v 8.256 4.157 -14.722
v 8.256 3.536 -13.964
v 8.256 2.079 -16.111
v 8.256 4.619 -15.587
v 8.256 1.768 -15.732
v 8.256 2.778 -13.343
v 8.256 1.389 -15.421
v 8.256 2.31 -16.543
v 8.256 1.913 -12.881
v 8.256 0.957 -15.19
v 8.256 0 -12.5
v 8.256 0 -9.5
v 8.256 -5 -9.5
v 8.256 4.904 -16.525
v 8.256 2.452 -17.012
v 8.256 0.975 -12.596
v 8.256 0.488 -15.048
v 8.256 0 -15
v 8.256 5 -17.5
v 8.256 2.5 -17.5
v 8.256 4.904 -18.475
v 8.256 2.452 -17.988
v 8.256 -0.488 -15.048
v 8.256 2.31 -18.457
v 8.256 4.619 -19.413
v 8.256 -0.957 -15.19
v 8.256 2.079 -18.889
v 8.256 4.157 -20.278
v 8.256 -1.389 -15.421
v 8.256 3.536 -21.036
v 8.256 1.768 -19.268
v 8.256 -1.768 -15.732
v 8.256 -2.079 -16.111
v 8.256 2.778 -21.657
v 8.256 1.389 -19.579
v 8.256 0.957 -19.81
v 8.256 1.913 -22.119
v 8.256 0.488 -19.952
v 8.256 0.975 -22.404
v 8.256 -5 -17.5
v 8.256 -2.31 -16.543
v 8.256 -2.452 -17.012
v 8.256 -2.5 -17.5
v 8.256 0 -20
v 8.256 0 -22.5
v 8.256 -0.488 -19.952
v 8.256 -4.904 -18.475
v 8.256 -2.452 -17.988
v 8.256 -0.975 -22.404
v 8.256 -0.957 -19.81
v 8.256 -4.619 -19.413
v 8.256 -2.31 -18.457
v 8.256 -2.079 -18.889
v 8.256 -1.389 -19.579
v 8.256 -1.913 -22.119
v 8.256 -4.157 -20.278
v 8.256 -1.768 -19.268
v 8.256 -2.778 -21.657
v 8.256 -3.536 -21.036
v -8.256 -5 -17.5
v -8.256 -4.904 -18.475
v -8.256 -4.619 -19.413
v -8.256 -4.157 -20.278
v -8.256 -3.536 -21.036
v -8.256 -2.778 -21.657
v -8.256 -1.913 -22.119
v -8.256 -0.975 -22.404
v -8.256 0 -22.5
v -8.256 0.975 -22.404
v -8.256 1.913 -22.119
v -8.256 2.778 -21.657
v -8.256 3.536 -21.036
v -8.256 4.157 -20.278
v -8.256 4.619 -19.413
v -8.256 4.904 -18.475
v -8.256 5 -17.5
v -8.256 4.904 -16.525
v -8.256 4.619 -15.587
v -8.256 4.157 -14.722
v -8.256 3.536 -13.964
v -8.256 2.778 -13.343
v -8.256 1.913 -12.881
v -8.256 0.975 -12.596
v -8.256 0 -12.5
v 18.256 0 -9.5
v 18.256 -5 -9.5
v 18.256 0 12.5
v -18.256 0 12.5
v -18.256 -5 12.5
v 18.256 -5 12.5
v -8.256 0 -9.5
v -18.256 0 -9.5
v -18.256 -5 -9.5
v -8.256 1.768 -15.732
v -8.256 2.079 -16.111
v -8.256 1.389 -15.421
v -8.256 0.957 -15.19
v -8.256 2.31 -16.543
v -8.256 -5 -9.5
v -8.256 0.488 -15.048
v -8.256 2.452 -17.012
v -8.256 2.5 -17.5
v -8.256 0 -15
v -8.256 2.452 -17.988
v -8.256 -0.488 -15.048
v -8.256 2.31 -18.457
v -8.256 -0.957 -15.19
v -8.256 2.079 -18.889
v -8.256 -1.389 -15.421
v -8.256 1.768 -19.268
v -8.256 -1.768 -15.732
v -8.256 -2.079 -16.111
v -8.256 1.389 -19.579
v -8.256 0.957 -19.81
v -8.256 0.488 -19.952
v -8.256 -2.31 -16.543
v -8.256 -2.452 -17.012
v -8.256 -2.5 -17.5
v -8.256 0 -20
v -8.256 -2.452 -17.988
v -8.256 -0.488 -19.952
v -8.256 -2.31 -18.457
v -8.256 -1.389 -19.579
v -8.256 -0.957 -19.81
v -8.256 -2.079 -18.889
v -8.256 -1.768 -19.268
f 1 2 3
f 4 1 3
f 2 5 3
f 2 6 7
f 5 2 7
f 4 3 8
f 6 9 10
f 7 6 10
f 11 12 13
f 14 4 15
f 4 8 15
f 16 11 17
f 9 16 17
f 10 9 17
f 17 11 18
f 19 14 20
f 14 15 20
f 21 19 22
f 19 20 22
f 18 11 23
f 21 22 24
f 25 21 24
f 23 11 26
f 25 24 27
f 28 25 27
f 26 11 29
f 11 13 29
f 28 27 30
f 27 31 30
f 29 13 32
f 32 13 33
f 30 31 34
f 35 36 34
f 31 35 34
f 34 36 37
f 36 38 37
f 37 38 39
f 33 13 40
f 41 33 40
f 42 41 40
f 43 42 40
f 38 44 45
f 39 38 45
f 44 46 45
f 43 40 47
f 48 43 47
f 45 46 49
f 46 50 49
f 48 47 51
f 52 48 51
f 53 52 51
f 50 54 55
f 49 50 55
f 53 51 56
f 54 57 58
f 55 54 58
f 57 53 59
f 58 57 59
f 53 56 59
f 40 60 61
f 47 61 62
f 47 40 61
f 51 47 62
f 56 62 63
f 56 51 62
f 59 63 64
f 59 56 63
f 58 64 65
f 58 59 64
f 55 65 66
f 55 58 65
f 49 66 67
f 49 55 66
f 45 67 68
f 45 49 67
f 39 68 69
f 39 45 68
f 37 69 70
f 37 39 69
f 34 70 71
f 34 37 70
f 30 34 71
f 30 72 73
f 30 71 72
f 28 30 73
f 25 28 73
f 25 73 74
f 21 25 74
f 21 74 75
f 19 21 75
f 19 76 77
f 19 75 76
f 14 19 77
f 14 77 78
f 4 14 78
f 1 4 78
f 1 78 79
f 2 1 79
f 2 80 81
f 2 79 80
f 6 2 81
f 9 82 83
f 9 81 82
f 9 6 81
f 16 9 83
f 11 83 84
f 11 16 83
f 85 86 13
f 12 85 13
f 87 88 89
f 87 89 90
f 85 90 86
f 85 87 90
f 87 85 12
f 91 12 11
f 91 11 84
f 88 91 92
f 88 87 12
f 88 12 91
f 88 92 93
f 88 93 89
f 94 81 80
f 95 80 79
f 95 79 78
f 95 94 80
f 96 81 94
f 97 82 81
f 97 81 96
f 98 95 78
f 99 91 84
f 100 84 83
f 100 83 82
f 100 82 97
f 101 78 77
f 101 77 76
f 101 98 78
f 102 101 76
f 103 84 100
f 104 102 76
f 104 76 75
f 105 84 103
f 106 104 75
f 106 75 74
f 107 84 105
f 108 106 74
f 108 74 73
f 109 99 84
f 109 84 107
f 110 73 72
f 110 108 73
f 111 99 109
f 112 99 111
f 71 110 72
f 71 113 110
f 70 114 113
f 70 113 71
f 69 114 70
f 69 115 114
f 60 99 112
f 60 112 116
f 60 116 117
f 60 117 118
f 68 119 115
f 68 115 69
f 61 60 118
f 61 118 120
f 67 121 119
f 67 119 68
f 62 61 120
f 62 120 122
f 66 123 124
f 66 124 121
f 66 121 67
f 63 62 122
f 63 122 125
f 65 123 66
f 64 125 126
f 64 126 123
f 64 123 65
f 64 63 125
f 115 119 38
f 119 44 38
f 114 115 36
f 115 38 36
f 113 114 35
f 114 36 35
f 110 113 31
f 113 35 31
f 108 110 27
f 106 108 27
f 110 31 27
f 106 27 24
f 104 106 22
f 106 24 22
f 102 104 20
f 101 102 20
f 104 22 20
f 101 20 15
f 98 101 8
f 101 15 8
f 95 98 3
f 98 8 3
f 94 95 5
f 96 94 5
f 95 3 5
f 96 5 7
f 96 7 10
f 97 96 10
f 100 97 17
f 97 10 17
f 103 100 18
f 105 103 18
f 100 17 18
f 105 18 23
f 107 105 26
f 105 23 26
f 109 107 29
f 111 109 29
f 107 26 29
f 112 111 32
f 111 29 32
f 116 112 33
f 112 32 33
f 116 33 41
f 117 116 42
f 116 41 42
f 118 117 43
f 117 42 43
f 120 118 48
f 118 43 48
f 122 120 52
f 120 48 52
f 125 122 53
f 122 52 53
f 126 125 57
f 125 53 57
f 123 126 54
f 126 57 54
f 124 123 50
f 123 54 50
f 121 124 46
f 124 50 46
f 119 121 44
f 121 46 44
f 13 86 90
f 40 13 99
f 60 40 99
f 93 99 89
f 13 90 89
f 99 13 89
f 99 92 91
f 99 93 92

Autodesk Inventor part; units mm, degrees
ref_plane "YZ Plane" through (0, 0, 0) normal (1, 0, 0) x (0, 1, 0)
ref_plane "XZ Plane" through (0, 0, 0) normal (0, 1, 0) x (-1, 0, 0)
ref_plane "XY Plane" through (0, 0, 0) normal (0, 0, 1) x (1, 0, 0)
sketch "Sketch1" plane through (0, 0, 0) normal (0, 1, 0) x (-1, 0, 0)
  line L0 (-18.2565, -12.5) -> (18.2565, -12.5)
  line L1 (18.2565, -12.5) -> (18.2565, 12.5)
  line L2 (18.2565, 12.5) -> (-18.2565, 12.5)
  line L3 (-18.2565, 12.5) -> (-18.2565, -12.5)
  line L4 (-18.2565, -12.5) -> (18.2565, 12.5) construction
  line L5 (18.2565, -12.5) -> (-18.2565, 12.5) construction
  point P0 (0, 0)
  dimension "d0" = 36.513
  dimension "d1" = 25
extrude "Extrusion1" add sketch "Sketch1" against normal blind 5
sketch "Sketch2" plane through (18.2565, 0, 12.5) normal (1, 0, 0) x (0, 0, -1)
  circle A0 centre (30, 0) radius 5
  line L0 (25, 0) -> (25, -5) projected
  line L1 (25, -5) -> (0, -5) projected
  line L2 (0, -5) -> (25, -5) projected
  line L3 (25, -5) -> (30, -5)
  line L4 (30, -5) -> (30, 0)
  line L5 (30, 0) -> (25, 0)
  line L6 (25, 0) -> (25, -5)
  point P0 (12.5, 0)
  dimension "d4" = 5
  dimension "d5" = 10
  dimension "d6" = 5
extrude "Extrusion2" add sketch "Sketch2" against normal blind 36.513
sketch "Sketch3" plane through (18.2565, -5, 12.5) normal (1, 0, 0) x (0, 0, -1)
  circle A0 centre (30, 5) radius 2.5
  line L0 (0, 0) -> (30, 0) projected
  line L1 (0, 5) -> (0, 0) projected
  point P0 (12.5, 5)
  dimension "d9" = 5
  dimension "d10" = 30
  dimension "d11" = 5
extrude "Extrusion3" cut sketch "Sketch3" against normal blind 36.513
sketch "Sketch4" plane through (0, -5, 0) normal (0, -1, 0) x (1, 0, 0)
  line L0 (18.2565, 12.5) -> (18.2565, -17.5) projected
  line L1 (18.2565, -9.5) -> (8.2565, -9.5)
  line L2 (8.2565, -9.5) -> (8.2565, -22.5)
  line L3 (8.2565, -22.5) -> (18.2565, -22.5)
  line L4 (18.2565, -22.5) -> (18.2565, -9.5)
  line L5 (-18.2565, -9.5) -> (-8.2565, -9.5)
  line L6 (-8.2565, -9.5) -> (-8.2565, -22.5)
  line L7 (-8.2565, -22.5) -> (-18.2565, -22.5)
  line L8 (-18.2565, -22.5) -> (-18.2565, -9.5)
  line L9 (18.2565, -17.5) -> (-18.2565, -17.5) projected
  line L10 (-18.2565, 12.5) -> (-18.2565, -17.5) projected
  point P0 (0, 0)
  point P1 (18.2565, -17.5)
  dimension "d14" = 5
  dimension "d15" = 16.513
  dimension "d16" = 0
  dimension "d17" = 10
  dimension "d18" = 13
extrude "Extrusion4" cut sketch "Sketch4" against normal blind 36.513
properties part number "hinge 2" material "Stainless Steel"
